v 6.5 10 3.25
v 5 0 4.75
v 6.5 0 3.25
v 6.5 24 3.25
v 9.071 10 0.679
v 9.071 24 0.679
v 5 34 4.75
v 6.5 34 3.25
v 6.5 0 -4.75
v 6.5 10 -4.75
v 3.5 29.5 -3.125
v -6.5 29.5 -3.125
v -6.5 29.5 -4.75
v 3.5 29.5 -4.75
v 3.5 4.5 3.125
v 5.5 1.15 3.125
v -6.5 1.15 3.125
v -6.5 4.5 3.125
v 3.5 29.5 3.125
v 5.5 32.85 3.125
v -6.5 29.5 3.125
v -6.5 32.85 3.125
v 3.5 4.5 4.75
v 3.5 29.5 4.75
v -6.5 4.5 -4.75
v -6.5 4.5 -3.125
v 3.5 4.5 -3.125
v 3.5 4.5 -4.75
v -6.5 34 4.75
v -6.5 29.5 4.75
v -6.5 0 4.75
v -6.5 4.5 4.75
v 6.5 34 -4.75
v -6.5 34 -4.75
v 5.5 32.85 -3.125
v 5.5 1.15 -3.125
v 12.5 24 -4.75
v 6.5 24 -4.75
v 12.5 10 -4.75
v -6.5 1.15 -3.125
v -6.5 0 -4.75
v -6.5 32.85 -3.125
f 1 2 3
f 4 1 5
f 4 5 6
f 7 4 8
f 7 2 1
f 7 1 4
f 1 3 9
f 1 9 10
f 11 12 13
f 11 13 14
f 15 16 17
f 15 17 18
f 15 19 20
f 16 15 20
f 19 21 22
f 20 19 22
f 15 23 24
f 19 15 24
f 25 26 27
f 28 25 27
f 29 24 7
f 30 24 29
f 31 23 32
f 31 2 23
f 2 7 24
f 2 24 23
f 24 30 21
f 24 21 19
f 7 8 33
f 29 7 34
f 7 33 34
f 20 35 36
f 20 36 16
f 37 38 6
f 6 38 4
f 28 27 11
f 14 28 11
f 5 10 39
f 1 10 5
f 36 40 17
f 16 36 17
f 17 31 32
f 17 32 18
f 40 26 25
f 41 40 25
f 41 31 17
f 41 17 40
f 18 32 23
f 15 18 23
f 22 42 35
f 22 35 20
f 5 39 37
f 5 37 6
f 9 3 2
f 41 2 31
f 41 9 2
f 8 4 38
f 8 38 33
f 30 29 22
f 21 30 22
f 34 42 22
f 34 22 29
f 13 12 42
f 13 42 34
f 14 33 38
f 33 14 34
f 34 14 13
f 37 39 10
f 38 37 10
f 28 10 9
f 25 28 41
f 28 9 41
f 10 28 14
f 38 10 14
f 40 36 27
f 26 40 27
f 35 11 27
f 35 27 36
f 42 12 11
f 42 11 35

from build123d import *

# Parameters (mm, degrees)
BOSS_EXTRUDE1_DEPTH = 34
SKETCH2_W           = 6.25
SKETCH2_H           = 31.7
CUT_EXTRUDE1_DEPTH  = 12
SKETCH3_W           = 10
SKETCH3_H           = 25
CUT_EXTRUDE2_DEPTH  = 12
SKETCH4_W           = 6
SKETCH4_H           = 10
CUT_EXTRUDE3_DEPTH  = 10
CHAMFER2_SIZE       = 1.5
CHAMFER3_SIZE       = 1.5
CHAMFER4_SIZE       = 1.5
CHAMFER4_SIZE_2     = 4.815472512


with BuildPart() as part:
    # Sketch1 → Boss-Extrude1 (new body)
    with BuildSketch(Plane(origin=(0, 0, 0), x_dir=(1, 0, 0), z_dir=(0, 1, 0))):
        Polygon((6.5, 4.75), (12.5, 4.75), (6.5, -4.75), (-6.5, -4.75), (-6.5, 4.75), align=None)
    extrude(amount=BOSS_EXTRUDE1_DEPTH)

    # Sketch2 → Cut-Extrude1 (cut)
    with BuildSketch(Plane.ZY.offset(6.5)):
        with Locations((0, 17)):
            Rectangle(SKETCH2_W, SKETCH2_H)
    extrude(amount=-CUT_EXTRUDE1_DEPTH, mode=Mode.SUBTRACT)

    # Sketch3 → Cut-Extrude2 (cut)
    with BuildSketch(Plane.XY.offset(4.75)):
        with Locations((-1.5, 17)):
            Rectangle(SKETCH3_W, SKETCH3_H)
    extrude(amount=-CUT_EXTRUDE2_DEPTH, mode=Mode.SUBTRACT)

    # Sketch4 → Cut-Extrude3 (cut)
    with BuildSketch(Plane.XY.offset(4.75)):
        with Locations((9.5, 29)):
            Rectangle(SKETCH4_W, SKETCH4_H)
        with Locations((9.5, 5)):
            Rectangle(SKETCH4_W, SKETCH4_H)
    extrude(amount=-CUT_EXTRUDE3_DEPTH, mode=Mode.SUBTRACT)

    # Chamfer2
    chamfer2_edges = [part.edges().sort_by_distance(p)[0] for p in [
        (6.5, 29, 4.75),
    ]]
    chamfer(chamfer2_edges, length=CHAMFER2_SIZE)

    # Chamfer3
    chamfer3_edges = [part.edges().sort_by_distance(p)[0] for p in [
        (6.5, 5, 4.75),
    ]]
    chamfer(chamfer3_edges, length=CHAMFER3_SIZE)

    # Chamfer4
    # the kernel refuses this chamfer: 4.815472512, 1.5 mm, written as the material it takes off along each edge
    with BuildSketch(Plane(origin=(6.5, -2.508851902, 4.75), x_dir=(-0.9965532165776719, 0, 0.08295593124482357), z_dir=(0, 1, 0))) as chamfer4_piece_1:
        Polygon((CHAMFER4_SIZE * 0.996553216578, -CHAMFER4_SIZE * 0.0829559312448), (-CHAMFER4_SIZE_2 * 0.602290752459, -CHAMFER4_SIZE_2 * 0.798276799955), (0, 0), align=None)
    extrude(amount=39.017703804, mode=Mode.SUBTRACT)


solid = part.part
